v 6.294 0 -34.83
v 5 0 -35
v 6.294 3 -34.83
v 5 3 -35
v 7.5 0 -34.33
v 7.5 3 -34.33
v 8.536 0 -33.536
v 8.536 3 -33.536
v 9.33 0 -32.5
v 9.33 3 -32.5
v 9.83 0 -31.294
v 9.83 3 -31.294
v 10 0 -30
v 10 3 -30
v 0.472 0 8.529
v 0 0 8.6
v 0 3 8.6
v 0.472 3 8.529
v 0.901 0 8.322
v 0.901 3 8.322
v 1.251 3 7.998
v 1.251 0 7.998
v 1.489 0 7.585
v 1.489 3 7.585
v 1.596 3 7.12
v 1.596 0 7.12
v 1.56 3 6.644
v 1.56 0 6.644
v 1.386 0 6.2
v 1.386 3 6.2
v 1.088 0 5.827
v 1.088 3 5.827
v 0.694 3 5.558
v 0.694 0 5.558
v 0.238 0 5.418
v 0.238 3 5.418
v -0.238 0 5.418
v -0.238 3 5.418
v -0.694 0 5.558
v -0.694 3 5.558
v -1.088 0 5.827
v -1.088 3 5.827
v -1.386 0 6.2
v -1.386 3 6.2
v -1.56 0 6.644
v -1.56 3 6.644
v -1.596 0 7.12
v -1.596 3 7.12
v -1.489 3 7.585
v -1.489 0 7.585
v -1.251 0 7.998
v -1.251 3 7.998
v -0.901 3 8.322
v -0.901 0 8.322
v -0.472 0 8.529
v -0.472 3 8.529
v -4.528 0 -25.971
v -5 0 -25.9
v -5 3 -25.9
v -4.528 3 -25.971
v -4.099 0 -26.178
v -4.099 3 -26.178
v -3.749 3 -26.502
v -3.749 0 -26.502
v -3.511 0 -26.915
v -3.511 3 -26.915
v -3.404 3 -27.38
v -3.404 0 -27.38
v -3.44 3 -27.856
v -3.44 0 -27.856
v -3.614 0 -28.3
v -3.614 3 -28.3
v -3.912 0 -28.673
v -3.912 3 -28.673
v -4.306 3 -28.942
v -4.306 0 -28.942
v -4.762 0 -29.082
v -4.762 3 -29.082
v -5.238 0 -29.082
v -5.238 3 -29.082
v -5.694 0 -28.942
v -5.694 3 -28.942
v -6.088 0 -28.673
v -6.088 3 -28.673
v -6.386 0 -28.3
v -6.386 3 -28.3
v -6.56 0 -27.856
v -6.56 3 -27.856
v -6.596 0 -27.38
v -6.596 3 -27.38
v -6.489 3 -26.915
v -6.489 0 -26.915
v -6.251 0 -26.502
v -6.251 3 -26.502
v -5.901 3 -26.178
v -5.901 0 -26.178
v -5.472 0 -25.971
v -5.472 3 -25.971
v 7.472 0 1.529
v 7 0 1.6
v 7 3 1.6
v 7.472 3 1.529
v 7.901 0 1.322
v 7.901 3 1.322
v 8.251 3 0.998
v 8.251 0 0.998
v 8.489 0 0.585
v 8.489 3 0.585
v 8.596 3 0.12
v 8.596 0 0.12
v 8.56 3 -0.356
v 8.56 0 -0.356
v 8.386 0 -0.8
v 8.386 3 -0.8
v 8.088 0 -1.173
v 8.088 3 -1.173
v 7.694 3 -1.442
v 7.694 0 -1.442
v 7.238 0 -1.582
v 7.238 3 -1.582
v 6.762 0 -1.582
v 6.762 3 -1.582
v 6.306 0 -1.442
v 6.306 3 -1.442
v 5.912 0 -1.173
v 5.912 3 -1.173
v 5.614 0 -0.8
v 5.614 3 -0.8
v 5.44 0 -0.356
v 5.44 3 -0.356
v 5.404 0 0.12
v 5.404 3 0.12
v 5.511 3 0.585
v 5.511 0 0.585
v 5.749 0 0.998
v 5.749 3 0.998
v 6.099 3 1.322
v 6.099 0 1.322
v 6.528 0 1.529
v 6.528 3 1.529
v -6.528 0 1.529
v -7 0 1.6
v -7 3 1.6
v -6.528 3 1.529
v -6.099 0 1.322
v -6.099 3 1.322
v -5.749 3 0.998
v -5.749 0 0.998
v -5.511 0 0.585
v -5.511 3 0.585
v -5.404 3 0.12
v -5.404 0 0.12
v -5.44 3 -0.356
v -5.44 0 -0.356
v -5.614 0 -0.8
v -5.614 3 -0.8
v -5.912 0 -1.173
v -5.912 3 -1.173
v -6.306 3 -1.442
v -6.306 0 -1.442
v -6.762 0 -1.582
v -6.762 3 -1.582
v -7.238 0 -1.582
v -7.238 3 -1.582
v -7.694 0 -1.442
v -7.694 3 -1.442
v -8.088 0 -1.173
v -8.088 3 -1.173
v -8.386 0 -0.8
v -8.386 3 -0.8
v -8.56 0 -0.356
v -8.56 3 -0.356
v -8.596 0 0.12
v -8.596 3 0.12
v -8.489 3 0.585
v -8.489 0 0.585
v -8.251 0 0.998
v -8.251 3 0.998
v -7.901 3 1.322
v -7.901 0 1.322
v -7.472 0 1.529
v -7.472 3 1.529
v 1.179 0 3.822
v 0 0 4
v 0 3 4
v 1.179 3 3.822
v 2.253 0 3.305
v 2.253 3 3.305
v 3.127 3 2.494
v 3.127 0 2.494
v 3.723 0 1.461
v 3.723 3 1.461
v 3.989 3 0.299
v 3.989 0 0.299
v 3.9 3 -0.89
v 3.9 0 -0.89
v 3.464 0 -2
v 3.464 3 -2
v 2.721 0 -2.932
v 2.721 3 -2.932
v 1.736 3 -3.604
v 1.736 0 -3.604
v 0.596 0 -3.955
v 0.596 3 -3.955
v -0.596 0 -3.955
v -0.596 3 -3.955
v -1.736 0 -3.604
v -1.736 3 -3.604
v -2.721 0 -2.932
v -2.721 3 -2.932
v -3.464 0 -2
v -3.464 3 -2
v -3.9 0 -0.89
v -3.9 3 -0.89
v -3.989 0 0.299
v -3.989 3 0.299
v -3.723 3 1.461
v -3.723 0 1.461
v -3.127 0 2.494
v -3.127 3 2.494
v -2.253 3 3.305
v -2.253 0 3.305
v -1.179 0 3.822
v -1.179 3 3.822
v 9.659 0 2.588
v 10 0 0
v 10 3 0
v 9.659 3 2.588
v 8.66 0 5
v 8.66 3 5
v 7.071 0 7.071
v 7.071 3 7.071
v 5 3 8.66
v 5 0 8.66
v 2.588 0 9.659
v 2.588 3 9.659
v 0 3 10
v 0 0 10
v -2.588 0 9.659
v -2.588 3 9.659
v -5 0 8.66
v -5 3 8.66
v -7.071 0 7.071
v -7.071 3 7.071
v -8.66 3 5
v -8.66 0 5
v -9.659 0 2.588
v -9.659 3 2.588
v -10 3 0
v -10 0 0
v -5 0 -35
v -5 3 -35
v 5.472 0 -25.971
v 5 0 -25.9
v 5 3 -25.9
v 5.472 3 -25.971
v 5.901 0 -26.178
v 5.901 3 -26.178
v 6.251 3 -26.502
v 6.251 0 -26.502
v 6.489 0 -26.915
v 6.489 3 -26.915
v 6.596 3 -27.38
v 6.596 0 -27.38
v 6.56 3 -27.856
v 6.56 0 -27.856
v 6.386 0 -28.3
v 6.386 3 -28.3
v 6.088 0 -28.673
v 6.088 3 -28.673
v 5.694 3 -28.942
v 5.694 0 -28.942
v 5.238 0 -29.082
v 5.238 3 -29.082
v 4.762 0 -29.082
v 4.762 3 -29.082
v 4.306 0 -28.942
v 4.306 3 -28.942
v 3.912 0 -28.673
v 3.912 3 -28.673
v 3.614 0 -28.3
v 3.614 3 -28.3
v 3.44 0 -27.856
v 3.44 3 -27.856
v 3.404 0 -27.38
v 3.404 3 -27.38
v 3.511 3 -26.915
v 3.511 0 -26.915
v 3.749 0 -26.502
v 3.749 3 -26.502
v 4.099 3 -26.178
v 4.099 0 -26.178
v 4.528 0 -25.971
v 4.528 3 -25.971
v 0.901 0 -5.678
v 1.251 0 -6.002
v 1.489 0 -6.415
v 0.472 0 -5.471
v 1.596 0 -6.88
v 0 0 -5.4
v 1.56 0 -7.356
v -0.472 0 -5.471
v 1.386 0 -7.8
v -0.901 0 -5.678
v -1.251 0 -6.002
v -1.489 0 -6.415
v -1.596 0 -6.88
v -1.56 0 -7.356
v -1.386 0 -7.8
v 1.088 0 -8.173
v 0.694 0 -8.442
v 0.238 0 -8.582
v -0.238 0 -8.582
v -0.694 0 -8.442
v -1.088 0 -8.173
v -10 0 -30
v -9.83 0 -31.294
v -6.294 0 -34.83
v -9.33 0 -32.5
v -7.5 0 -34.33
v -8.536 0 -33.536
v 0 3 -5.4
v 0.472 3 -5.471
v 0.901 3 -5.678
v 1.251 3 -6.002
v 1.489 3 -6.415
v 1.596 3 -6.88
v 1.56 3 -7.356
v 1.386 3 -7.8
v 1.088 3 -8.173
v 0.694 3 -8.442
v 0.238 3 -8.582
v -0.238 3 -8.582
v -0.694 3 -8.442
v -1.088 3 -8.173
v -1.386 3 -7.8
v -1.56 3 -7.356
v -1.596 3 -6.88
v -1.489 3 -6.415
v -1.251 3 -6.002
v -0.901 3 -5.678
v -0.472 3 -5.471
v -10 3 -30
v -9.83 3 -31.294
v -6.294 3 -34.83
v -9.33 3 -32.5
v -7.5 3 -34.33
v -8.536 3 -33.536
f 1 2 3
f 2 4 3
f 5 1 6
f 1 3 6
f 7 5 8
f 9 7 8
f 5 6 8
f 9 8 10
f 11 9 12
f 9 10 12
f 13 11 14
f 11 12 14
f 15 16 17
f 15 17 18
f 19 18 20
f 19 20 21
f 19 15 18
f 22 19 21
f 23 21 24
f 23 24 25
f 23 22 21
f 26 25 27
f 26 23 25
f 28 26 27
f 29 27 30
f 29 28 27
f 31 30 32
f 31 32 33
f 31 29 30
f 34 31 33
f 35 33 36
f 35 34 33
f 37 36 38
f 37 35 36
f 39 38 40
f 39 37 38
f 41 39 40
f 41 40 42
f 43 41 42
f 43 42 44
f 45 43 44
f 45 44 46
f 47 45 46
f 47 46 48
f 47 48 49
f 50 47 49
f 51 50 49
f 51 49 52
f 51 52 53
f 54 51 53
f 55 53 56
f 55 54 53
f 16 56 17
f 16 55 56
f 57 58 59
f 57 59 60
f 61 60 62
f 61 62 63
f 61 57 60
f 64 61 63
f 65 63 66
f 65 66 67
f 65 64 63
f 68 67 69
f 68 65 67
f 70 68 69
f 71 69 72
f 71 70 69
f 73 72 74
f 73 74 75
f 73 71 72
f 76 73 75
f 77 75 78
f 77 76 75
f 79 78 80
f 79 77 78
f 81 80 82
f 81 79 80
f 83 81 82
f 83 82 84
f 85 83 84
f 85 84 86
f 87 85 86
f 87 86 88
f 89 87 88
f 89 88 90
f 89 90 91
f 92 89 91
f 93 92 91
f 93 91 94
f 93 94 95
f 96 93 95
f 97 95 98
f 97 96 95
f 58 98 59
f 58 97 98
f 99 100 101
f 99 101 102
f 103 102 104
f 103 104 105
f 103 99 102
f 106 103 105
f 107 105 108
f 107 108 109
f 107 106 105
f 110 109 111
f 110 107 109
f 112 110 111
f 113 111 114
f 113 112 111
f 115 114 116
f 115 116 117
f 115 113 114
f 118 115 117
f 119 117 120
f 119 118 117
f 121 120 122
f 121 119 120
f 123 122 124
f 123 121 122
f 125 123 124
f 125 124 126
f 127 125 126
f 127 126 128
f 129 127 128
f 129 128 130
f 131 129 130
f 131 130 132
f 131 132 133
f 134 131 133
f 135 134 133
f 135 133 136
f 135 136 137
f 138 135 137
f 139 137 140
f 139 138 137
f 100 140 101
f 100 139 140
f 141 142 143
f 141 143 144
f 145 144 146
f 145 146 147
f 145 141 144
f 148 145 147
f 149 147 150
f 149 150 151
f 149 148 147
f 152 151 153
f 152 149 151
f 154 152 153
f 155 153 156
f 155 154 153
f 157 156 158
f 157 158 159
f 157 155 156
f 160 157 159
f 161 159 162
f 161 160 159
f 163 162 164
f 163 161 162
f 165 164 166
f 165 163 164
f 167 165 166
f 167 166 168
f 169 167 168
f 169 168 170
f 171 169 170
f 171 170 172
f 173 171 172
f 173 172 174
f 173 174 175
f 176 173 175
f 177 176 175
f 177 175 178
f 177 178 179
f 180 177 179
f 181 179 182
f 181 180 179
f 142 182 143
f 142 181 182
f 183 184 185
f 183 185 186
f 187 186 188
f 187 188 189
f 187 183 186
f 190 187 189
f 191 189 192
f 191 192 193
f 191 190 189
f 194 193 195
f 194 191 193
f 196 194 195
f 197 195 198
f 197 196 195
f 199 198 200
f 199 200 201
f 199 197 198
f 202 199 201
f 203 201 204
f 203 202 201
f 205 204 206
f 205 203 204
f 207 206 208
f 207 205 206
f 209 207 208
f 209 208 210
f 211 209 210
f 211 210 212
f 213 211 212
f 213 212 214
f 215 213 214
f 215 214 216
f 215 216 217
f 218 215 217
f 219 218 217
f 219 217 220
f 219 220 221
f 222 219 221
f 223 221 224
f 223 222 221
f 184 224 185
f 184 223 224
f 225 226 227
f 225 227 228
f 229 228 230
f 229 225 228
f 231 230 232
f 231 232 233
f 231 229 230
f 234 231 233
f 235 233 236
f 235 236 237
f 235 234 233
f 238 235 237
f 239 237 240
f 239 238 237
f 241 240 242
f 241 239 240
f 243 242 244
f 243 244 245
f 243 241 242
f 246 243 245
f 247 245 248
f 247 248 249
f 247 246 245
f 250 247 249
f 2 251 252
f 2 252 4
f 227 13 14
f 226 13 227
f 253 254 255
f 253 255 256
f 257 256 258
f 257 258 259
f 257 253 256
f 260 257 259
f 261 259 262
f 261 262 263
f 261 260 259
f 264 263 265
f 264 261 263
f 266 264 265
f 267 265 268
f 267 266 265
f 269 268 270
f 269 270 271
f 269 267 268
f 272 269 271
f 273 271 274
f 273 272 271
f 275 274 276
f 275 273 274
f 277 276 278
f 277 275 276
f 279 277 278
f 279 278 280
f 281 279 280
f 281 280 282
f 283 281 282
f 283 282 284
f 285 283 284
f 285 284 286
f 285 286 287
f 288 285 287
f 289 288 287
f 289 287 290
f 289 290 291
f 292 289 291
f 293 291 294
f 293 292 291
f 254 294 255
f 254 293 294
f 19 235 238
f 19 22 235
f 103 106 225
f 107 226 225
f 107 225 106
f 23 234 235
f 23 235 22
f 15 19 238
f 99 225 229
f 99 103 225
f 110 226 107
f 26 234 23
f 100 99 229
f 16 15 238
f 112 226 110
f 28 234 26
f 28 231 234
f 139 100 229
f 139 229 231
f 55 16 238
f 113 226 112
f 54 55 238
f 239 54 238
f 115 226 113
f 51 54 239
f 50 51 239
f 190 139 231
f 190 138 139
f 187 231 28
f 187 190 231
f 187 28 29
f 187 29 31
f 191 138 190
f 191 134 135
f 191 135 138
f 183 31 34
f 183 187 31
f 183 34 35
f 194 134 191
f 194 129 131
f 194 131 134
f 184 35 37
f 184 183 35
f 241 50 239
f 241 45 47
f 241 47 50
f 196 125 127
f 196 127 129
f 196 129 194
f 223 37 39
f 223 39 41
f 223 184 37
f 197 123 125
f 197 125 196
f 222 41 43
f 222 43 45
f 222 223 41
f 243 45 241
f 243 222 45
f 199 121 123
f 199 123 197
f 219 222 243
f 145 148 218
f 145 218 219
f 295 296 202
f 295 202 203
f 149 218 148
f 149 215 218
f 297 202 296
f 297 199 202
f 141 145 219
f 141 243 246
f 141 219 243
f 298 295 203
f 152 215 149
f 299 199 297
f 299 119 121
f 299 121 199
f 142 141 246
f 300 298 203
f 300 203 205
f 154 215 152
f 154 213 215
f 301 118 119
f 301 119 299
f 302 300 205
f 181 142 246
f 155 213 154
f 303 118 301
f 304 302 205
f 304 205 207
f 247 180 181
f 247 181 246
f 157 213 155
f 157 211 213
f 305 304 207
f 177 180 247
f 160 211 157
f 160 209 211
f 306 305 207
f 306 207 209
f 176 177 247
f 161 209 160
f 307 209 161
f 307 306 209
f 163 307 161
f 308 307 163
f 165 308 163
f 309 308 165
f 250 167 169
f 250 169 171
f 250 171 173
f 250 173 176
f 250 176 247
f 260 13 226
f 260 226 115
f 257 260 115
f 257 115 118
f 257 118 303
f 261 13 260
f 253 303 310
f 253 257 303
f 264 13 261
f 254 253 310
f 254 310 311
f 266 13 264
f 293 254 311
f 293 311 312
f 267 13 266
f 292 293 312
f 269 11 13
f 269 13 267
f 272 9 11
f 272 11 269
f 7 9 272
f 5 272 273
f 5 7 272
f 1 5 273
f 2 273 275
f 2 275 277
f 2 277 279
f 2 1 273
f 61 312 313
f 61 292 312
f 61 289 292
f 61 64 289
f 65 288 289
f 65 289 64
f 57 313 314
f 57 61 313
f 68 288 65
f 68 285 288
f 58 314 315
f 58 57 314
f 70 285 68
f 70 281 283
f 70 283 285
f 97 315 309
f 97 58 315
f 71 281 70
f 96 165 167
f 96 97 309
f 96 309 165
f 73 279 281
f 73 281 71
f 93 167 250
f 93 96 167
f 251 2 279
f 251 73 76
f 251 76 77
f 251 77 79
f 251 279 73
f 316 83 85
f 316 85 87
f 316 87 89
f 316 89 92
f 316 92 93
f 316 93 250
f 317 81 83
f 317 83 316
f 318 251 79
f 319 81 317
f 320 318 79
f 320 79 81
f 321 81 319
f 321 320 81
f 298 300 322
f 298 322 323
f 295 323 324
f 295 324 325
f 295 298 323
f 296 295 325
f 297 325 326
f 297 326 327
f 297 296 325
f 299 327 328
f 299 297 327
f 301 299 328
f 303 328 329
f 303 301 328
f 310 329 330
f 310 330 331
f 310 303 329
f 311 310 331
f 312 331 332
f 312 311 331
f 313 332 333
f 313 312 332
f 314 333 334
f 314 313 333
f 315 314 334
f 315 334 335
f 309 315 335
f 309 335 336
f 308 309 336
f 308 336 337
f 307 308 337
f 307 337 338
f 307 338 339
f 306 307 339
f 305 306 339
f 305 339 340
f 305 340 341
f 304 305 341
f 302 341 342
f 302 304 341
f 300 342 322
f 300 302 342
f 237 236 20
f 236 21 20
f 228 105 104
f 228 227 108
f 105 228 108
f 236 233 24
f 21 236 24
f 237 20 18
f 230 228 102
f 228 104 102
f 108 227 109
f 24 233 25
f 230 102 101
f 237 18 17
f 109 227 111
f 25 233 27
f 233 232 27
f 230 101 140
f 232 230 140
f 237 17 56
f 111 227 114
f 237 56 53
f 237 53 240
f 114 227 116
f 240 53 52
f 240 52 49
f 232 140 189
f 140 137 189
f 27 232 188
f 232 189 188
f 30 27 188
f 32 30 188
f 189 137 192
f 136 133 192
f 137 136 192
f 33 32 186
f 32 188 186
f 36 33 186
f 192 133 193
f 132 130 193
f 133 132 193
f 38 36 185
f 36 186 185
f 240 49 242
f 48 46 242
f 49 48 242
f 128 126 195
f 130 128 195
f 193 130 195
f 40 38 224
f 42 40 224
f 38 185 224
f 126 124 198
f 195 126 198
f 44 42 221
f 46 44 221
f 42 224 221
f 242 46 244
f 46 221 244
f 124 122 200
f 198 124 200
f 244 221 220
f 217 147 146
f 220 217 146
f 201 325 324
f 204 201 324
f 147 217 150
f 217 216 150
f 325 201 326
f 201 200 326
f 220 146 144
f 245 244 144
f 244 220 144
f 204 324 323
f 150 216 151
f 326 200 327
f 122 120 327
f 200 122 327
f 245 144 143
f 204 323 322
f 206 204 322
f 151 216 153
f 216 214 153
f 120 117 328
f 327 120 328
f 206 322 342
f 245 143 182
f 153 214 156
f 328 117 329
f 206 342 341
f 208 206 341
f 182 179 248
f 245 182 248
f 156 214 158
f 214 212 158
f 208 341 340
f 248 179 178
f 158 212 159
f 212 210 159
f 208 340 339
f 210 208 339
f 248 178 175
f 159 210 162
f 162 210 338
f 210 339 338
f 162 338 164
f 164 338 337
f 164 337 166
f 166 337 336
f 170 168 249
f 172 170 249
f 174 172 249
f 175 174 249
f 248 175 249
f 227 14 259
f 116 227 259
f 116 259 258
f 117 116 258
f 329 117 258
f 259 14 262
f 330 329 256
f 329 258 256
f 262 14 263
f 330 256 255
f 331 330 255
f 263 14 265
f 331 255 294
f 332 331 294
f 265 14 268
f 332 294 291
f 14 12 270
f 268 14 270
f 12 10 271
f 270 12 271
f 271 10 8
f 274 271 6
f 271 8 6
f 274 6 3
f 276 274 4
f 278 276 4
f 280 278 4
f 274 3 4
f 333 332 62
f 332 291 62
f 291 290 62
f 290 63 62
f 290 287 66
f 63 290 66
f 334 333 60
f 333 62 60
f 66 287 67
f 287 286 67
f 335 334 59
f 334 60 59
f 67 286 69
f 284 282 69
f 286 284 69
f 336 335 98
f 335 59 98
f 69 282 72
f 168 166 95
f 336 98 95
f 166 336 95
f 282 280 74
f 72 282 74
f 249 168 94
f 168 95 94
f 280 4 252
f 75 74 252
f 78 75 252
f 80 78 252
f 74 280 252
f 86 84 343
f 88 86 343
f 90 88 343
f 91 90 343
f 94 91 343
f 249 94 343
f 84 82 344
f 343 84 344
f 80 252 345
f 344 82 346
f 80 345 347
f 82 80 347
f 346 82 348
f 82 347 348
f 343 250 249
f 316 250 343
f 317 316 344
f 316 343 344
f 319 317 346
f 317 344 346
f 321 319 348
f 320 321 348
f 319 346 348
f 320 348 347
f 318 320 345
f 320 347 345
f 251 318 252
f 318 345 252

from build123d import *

# Parameters (mm, degrees)
SKETCH_1_R      = 1.6
SKETCH_1_R_2    = 4
EXTRUDE_1_DEPTH = 3
FILLET_1_R      = 5


with BuildPart() as part:
    # 草图1 → 凸台-拉伸1 (new body)
    with BuildSketch(Plane(origin=(0, 0, 0), x_dir=(1, 0, 0), z_dir=(0, 1, 0))):
        with BuildLine():
            Line((-10, 0), (-10, 35))
            Line((-10, 35), (10, 35))
            Line((10, 35), (10, 0))
            ThreePointArc((10, 0), (0, -10), (-10, 0))
        make_face()
        with Locations(Location((-5, 27.5, 0), (0, 0, 270))):
            Circle(SKETCH_1_R, mode=Mode.SUBTRACT)
        with Locations(Location((5, 27.5, 0), (0, 0, 270))):
            Circle(SKETCH_1_R, mode=Mode.SUBTRACT)
        with Locations(Location((0, 7, 0), (0, 0, 270))):
            Circle(SKETCH_1_R, mode=Mode.SUBTRACT)
        with Locations(Location((-7, 0, 0), (0, 0, 270))):
            Circle(SKETCH_1_R, mode=Mode.SUBTRACT)
        with Locations(Location((0, -7, 0), (0, 0, 270))):
            Circle(SKETCH_1_R, mode=Mode.SUBTRACT)
        with Locations(Location((7, 0, 0), (0, 0, 270))):
            Circle(SKETCH_1_R, mode=Mode.SUBTRACT)
        with Locations(Location((0, 0, 0), (0, 0, 270))):
            Circle(SKETCH_1_R_2, mode=Mode.SUBTRACT)
    extrude(amount=EXTRUDE_1_DEPTH)

    # 圆角1
    fillet_1_edges = [part.edges().sort_by_distance(p)[0] for p in [
        (-10, 1.5, -35),
        (10, 1.5, -35),
    ]]
    fillet(fillet_1_edges, radius=FILLET_1_R)


solid = part.part
